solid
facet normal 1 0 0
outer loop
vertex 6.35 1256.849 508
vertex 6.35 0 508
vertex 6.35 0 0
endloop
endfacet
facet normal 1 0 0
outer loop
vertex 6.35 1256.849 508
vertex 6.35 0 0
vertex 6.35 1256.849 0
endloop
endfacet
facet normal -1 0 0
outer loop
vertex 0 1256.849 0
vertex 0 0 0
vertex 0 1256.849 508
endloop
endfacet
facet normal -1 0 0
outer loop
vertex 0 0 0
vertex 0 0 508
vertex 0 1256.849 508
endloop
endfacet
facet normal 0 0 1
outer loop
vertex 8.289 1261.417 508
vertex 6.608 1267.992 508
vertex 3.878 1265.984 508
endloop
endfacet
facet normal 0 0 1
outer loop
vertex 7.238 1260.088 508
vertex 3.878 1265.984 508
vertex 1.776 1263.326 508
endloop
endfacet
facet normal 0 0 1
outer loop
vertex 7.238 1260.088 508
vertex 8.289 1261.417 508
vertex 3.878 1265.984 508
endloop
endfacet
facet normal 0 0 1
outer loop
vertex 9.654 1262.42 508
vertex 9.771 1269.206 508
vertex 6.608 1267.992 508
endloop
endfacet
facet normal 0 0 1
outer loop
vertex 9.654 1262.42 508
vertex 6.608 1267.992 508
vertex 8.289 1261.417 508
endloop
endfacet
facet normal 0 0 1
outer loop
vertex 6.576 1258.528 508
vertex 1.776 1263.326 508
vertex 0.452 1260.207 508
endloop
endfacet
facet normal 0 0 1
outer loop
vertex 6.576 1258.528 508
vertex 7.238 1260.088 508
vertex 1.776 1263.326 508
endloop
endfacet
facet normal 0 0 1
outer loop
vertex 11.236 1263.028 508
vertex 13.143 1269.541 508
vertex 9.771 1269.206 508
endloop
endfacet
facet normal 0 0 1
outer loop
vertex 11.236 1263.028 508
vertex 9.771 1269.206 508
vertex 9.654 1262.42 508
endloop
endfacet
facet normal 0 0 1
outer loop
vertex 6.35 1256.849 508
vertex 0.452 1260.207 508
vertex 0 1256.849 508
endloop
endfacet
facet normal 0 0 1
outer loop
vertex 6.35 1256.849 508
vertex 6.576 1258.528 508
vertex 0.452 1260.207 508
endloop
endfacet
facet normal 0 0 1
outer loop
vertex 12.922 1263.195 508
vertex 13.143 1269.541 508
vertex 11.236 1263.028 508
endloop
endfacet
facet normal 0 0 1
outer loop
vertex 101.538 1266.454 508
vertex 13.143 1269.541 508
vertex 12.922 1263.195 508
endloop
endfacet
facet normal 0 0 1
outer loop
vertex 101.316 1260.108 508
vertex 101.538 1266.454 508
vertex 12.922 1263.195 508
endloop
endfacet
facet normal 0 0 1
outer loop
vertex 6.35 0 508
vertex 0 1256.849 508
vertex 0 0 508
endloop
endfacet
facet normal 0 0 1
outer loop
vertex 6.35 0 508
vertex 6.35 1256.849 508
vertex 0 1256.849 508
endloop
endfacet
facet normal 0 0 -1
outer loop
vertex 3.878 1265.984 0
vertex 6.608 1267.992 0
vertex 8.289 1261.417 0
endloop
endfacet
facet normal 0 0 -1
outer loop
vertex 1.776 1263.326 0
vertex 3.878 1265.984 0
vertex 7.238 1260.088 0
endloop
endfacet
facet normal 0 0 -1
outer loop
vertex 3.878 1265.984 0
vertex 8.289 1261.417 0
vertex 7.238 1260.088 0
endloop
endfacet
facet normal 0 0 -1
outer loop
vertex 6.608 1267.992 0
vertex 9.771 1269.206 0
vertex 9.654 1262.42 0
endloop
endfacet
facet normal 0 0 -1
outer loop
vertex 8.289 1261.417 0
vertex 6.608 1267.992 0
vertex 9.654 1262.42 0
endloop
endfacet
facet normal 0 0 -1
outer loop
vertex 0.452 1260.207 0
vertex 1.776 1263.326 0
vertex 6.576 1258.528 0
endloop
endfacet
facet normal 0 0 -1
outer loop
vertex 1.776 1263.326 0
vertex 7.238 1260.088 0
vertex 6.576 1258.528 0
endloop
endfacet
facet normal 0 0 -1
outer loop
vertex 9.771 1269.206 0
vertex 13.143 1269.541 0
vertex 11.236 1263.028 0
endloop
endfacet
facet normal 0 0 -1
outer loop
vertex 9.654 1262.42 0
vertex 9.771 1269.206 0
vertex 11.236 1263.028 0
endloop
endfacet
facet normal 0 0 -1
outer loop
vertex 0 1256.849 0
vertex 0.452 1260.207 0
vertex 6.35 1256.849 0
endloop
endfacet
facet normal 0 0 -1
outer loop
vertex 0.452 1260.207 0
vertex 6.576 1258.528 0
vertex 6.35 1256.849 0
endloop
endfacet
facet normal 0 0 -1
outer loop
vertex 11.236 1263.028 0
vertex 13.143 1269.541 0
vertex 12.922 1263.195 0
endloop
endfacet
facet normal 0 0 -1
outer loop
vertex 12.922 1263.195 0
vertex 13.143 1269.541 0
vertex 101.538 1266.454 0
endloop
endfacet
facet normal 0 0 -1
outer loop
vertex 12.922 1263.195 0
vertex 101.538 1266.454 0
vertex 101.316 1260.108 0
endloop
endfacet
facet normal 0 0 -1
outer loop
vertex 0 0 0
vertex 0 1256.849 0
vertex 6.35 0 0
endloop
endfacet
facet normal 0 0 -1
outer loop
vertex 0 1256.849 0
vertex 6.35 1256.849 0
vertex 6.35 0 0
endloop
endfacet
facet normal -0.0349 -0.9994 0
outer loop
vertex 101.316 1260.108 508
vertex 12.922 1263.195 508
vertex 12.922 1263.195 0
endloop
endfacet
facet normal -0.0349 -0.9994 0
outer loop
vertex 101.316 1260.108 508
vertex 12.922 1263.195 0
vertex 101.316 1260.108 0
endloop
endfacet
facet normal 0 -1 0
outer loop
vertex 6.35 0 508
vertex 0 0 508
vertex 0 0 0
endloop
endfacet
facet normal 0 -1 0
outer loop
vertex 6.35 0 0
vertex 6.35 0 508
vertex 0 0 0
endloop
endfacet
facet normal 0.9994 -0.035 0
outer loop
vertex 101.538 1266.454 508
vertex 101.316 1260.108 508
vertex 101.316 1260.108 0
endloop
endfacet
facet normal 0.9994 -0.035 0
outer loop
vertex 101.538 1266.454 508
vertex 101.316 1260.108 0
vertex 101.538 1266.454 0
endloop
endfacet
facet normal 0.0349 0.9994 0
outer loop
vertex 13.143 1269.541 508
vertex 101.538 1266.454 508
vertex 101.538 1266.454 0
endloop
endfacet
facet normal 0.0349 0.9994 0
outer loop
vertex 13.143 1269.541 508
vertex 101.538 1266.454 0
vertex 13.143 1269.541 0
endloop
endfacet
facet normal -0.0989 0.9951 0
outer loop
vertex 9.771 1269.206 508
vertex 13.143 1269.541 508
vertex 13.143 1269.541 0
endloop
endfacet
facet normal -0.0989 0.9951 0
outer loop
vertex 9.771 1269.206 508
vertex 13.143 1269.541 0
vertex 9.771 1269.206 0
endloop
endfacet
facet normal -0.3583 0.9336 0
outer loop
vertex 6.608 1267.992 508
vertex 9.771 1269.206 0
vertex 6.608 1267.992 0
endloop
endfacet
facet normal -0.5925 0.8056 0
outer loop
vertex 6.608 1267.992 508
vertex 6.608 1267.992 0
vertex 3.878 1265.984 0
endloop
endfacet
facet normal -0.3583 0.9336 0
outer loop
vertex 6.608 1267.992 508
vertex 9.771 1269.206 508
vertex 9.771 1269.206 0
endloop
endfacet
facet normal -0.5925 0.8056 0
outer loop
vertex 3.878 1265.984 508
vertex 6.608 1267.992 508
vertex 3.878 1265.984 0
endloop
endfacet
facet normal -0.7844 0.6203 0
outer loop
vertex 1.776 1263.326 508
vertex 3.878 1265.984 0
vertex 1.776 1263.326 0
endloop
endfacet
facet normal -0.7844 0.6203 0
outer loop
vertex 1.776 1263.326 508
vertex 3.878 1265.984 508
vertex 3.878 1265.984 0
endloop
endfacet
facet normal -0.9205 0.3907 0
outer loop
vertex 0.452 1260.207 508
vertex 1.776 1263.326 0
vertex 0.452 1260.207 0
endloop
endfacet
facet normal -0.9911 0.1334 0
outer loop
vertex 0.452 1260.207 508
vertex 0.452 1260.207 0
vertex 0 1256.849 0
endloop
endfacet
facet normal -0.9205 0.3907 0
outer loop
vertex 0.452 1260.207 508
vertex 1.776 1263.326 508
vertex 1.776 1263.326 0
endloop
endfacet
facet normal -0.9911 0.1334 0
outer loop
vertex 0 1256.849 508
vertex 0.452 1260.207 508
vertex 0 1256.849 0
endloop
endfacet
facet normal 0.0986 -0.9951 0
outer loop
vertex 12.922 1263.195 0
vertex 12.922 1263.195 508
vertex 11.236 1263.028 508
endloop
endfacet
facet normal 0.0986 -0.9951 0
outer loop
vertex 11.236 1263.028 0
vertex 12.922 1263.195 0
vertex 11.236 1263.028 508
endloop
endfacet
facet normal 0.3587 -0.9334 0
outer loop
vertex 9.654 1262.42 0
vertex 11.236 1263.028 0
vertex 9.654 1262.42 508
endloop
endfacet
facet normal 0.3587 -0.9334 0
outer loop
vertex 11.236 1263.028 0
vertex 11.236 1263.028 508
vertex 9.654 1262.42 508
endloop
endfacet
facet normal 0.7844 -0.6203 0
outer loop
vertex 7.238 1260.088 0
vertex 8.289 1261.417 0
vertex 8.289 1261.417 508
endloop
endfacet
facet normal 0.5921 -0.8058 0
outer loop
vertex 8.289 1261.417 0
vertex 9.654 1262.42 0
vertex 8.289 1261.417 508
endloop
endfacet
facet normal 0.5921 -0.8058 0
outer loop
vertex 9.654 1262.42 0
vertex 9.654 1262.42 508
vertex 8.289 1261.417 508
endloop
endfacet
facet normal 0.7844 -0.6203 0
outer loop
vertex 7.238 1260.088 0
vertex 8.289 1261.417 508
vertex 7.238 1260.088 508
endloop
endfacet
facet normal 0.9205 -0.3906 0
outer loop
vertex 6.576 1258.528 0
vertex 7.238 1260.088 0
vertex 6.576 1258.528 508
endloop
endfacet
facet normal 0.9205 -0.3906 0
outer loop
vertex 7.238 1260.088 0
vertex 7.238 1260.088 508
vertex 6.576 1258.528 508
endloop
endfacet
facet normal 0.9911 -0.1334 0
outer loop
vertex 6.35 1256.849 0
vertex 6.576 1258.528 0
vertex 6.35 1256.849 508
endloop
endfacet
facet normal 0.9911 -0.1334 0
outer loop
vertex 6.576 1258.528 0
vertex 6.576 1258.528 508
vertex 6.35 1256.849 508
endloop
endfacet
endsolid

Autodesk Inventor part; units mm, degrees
ref_plane "YZ Plane" through (0, 0, 0) normal (1, 0, 0) x (0, 1, 0)
ref_plane "XZ Plane" through (0, 0, 0) normal (0, 1, 0) x (-1, 0, 0)
ref_plane "XY Plane" through (0, 0, 0) normal (0, 0, 1) x (1, 0, 0)
sketch "Sketch29" plane through (0, 0, 0) normal (1, 0, 0) x (0, 1, 0)
  line L0 (0, 0) -> (1270, 0)
  line L1 (1270, 0) -> (1270, 508)
  line L2 (1270, 508) -> (0, 508)
  line L3 (0, 508) -> (0, 0)
  dimension "d230" = 508
  dimension "d231" = 1270
extrude "Plate26" add sketch "Sketch29" along normal blind 6.35
sketch "Sketch30" plane through (-0.2216, 1263.6539, 508) normal (0.0348995, 0.9993908, 0) x (-0.9993908, 0.0348995, 0)
  line L0 (0, -508) -> (0, 0)
  line L1 (0, 0) -> (-101.6, 0)
  line L2 (-101.6, 0) -> (-101.6, -508)
  line L3 (-101.6, -508) -> (0, -508)
edge flange "Flange23" height 101.6 angle 92 thickness 6.35 bend radius 6.35 thickness toward (0.0348995, 0.9993908, 0) relief tear relief width 6.35 relief depth 3.175 edges at (6.35, 1270, 254) wall of the first edge with corners at (-0.2216, 1263.6539, 0) (-0.2216, 1263.6539, 508) (101.3165, 1260.1081, 508) (101.3165, 1260.1081, 0)
bend "Bend23"
corner "Corner22"
equation "\"d230\" = LARGO"
equation "\"d231\" = ALTO"
equation "\"d237\" = LARGOF"
equation "\"d238\" = ANGULOF"
equation "\"BendRadius\" = Thickness"
equation "\"BendReliefWidth\" = Thickness"
equation "\"BendReliefDepth\" = 0.5 * Thickness"
equation "\"CornerReliefSize\" = 4 * Thickness"
equation "\"MinimumRemnant\" = 2 * Thickness"
equation "\"TransitionRadius\" = BendRadius"
equation "\"JacobiRadiusSize\" = BendRadius"
equation "\"GapSize\" = Thickness"
equation "\"LARGO\" = 508"
equation "\"ALTO\" = 1270"
equation "\"LARGOF\" = 101.6"
equation "\"ANGULOF\" = 92deg"
properties part number "BackWallTop" material "Carbon Steel - A36"
